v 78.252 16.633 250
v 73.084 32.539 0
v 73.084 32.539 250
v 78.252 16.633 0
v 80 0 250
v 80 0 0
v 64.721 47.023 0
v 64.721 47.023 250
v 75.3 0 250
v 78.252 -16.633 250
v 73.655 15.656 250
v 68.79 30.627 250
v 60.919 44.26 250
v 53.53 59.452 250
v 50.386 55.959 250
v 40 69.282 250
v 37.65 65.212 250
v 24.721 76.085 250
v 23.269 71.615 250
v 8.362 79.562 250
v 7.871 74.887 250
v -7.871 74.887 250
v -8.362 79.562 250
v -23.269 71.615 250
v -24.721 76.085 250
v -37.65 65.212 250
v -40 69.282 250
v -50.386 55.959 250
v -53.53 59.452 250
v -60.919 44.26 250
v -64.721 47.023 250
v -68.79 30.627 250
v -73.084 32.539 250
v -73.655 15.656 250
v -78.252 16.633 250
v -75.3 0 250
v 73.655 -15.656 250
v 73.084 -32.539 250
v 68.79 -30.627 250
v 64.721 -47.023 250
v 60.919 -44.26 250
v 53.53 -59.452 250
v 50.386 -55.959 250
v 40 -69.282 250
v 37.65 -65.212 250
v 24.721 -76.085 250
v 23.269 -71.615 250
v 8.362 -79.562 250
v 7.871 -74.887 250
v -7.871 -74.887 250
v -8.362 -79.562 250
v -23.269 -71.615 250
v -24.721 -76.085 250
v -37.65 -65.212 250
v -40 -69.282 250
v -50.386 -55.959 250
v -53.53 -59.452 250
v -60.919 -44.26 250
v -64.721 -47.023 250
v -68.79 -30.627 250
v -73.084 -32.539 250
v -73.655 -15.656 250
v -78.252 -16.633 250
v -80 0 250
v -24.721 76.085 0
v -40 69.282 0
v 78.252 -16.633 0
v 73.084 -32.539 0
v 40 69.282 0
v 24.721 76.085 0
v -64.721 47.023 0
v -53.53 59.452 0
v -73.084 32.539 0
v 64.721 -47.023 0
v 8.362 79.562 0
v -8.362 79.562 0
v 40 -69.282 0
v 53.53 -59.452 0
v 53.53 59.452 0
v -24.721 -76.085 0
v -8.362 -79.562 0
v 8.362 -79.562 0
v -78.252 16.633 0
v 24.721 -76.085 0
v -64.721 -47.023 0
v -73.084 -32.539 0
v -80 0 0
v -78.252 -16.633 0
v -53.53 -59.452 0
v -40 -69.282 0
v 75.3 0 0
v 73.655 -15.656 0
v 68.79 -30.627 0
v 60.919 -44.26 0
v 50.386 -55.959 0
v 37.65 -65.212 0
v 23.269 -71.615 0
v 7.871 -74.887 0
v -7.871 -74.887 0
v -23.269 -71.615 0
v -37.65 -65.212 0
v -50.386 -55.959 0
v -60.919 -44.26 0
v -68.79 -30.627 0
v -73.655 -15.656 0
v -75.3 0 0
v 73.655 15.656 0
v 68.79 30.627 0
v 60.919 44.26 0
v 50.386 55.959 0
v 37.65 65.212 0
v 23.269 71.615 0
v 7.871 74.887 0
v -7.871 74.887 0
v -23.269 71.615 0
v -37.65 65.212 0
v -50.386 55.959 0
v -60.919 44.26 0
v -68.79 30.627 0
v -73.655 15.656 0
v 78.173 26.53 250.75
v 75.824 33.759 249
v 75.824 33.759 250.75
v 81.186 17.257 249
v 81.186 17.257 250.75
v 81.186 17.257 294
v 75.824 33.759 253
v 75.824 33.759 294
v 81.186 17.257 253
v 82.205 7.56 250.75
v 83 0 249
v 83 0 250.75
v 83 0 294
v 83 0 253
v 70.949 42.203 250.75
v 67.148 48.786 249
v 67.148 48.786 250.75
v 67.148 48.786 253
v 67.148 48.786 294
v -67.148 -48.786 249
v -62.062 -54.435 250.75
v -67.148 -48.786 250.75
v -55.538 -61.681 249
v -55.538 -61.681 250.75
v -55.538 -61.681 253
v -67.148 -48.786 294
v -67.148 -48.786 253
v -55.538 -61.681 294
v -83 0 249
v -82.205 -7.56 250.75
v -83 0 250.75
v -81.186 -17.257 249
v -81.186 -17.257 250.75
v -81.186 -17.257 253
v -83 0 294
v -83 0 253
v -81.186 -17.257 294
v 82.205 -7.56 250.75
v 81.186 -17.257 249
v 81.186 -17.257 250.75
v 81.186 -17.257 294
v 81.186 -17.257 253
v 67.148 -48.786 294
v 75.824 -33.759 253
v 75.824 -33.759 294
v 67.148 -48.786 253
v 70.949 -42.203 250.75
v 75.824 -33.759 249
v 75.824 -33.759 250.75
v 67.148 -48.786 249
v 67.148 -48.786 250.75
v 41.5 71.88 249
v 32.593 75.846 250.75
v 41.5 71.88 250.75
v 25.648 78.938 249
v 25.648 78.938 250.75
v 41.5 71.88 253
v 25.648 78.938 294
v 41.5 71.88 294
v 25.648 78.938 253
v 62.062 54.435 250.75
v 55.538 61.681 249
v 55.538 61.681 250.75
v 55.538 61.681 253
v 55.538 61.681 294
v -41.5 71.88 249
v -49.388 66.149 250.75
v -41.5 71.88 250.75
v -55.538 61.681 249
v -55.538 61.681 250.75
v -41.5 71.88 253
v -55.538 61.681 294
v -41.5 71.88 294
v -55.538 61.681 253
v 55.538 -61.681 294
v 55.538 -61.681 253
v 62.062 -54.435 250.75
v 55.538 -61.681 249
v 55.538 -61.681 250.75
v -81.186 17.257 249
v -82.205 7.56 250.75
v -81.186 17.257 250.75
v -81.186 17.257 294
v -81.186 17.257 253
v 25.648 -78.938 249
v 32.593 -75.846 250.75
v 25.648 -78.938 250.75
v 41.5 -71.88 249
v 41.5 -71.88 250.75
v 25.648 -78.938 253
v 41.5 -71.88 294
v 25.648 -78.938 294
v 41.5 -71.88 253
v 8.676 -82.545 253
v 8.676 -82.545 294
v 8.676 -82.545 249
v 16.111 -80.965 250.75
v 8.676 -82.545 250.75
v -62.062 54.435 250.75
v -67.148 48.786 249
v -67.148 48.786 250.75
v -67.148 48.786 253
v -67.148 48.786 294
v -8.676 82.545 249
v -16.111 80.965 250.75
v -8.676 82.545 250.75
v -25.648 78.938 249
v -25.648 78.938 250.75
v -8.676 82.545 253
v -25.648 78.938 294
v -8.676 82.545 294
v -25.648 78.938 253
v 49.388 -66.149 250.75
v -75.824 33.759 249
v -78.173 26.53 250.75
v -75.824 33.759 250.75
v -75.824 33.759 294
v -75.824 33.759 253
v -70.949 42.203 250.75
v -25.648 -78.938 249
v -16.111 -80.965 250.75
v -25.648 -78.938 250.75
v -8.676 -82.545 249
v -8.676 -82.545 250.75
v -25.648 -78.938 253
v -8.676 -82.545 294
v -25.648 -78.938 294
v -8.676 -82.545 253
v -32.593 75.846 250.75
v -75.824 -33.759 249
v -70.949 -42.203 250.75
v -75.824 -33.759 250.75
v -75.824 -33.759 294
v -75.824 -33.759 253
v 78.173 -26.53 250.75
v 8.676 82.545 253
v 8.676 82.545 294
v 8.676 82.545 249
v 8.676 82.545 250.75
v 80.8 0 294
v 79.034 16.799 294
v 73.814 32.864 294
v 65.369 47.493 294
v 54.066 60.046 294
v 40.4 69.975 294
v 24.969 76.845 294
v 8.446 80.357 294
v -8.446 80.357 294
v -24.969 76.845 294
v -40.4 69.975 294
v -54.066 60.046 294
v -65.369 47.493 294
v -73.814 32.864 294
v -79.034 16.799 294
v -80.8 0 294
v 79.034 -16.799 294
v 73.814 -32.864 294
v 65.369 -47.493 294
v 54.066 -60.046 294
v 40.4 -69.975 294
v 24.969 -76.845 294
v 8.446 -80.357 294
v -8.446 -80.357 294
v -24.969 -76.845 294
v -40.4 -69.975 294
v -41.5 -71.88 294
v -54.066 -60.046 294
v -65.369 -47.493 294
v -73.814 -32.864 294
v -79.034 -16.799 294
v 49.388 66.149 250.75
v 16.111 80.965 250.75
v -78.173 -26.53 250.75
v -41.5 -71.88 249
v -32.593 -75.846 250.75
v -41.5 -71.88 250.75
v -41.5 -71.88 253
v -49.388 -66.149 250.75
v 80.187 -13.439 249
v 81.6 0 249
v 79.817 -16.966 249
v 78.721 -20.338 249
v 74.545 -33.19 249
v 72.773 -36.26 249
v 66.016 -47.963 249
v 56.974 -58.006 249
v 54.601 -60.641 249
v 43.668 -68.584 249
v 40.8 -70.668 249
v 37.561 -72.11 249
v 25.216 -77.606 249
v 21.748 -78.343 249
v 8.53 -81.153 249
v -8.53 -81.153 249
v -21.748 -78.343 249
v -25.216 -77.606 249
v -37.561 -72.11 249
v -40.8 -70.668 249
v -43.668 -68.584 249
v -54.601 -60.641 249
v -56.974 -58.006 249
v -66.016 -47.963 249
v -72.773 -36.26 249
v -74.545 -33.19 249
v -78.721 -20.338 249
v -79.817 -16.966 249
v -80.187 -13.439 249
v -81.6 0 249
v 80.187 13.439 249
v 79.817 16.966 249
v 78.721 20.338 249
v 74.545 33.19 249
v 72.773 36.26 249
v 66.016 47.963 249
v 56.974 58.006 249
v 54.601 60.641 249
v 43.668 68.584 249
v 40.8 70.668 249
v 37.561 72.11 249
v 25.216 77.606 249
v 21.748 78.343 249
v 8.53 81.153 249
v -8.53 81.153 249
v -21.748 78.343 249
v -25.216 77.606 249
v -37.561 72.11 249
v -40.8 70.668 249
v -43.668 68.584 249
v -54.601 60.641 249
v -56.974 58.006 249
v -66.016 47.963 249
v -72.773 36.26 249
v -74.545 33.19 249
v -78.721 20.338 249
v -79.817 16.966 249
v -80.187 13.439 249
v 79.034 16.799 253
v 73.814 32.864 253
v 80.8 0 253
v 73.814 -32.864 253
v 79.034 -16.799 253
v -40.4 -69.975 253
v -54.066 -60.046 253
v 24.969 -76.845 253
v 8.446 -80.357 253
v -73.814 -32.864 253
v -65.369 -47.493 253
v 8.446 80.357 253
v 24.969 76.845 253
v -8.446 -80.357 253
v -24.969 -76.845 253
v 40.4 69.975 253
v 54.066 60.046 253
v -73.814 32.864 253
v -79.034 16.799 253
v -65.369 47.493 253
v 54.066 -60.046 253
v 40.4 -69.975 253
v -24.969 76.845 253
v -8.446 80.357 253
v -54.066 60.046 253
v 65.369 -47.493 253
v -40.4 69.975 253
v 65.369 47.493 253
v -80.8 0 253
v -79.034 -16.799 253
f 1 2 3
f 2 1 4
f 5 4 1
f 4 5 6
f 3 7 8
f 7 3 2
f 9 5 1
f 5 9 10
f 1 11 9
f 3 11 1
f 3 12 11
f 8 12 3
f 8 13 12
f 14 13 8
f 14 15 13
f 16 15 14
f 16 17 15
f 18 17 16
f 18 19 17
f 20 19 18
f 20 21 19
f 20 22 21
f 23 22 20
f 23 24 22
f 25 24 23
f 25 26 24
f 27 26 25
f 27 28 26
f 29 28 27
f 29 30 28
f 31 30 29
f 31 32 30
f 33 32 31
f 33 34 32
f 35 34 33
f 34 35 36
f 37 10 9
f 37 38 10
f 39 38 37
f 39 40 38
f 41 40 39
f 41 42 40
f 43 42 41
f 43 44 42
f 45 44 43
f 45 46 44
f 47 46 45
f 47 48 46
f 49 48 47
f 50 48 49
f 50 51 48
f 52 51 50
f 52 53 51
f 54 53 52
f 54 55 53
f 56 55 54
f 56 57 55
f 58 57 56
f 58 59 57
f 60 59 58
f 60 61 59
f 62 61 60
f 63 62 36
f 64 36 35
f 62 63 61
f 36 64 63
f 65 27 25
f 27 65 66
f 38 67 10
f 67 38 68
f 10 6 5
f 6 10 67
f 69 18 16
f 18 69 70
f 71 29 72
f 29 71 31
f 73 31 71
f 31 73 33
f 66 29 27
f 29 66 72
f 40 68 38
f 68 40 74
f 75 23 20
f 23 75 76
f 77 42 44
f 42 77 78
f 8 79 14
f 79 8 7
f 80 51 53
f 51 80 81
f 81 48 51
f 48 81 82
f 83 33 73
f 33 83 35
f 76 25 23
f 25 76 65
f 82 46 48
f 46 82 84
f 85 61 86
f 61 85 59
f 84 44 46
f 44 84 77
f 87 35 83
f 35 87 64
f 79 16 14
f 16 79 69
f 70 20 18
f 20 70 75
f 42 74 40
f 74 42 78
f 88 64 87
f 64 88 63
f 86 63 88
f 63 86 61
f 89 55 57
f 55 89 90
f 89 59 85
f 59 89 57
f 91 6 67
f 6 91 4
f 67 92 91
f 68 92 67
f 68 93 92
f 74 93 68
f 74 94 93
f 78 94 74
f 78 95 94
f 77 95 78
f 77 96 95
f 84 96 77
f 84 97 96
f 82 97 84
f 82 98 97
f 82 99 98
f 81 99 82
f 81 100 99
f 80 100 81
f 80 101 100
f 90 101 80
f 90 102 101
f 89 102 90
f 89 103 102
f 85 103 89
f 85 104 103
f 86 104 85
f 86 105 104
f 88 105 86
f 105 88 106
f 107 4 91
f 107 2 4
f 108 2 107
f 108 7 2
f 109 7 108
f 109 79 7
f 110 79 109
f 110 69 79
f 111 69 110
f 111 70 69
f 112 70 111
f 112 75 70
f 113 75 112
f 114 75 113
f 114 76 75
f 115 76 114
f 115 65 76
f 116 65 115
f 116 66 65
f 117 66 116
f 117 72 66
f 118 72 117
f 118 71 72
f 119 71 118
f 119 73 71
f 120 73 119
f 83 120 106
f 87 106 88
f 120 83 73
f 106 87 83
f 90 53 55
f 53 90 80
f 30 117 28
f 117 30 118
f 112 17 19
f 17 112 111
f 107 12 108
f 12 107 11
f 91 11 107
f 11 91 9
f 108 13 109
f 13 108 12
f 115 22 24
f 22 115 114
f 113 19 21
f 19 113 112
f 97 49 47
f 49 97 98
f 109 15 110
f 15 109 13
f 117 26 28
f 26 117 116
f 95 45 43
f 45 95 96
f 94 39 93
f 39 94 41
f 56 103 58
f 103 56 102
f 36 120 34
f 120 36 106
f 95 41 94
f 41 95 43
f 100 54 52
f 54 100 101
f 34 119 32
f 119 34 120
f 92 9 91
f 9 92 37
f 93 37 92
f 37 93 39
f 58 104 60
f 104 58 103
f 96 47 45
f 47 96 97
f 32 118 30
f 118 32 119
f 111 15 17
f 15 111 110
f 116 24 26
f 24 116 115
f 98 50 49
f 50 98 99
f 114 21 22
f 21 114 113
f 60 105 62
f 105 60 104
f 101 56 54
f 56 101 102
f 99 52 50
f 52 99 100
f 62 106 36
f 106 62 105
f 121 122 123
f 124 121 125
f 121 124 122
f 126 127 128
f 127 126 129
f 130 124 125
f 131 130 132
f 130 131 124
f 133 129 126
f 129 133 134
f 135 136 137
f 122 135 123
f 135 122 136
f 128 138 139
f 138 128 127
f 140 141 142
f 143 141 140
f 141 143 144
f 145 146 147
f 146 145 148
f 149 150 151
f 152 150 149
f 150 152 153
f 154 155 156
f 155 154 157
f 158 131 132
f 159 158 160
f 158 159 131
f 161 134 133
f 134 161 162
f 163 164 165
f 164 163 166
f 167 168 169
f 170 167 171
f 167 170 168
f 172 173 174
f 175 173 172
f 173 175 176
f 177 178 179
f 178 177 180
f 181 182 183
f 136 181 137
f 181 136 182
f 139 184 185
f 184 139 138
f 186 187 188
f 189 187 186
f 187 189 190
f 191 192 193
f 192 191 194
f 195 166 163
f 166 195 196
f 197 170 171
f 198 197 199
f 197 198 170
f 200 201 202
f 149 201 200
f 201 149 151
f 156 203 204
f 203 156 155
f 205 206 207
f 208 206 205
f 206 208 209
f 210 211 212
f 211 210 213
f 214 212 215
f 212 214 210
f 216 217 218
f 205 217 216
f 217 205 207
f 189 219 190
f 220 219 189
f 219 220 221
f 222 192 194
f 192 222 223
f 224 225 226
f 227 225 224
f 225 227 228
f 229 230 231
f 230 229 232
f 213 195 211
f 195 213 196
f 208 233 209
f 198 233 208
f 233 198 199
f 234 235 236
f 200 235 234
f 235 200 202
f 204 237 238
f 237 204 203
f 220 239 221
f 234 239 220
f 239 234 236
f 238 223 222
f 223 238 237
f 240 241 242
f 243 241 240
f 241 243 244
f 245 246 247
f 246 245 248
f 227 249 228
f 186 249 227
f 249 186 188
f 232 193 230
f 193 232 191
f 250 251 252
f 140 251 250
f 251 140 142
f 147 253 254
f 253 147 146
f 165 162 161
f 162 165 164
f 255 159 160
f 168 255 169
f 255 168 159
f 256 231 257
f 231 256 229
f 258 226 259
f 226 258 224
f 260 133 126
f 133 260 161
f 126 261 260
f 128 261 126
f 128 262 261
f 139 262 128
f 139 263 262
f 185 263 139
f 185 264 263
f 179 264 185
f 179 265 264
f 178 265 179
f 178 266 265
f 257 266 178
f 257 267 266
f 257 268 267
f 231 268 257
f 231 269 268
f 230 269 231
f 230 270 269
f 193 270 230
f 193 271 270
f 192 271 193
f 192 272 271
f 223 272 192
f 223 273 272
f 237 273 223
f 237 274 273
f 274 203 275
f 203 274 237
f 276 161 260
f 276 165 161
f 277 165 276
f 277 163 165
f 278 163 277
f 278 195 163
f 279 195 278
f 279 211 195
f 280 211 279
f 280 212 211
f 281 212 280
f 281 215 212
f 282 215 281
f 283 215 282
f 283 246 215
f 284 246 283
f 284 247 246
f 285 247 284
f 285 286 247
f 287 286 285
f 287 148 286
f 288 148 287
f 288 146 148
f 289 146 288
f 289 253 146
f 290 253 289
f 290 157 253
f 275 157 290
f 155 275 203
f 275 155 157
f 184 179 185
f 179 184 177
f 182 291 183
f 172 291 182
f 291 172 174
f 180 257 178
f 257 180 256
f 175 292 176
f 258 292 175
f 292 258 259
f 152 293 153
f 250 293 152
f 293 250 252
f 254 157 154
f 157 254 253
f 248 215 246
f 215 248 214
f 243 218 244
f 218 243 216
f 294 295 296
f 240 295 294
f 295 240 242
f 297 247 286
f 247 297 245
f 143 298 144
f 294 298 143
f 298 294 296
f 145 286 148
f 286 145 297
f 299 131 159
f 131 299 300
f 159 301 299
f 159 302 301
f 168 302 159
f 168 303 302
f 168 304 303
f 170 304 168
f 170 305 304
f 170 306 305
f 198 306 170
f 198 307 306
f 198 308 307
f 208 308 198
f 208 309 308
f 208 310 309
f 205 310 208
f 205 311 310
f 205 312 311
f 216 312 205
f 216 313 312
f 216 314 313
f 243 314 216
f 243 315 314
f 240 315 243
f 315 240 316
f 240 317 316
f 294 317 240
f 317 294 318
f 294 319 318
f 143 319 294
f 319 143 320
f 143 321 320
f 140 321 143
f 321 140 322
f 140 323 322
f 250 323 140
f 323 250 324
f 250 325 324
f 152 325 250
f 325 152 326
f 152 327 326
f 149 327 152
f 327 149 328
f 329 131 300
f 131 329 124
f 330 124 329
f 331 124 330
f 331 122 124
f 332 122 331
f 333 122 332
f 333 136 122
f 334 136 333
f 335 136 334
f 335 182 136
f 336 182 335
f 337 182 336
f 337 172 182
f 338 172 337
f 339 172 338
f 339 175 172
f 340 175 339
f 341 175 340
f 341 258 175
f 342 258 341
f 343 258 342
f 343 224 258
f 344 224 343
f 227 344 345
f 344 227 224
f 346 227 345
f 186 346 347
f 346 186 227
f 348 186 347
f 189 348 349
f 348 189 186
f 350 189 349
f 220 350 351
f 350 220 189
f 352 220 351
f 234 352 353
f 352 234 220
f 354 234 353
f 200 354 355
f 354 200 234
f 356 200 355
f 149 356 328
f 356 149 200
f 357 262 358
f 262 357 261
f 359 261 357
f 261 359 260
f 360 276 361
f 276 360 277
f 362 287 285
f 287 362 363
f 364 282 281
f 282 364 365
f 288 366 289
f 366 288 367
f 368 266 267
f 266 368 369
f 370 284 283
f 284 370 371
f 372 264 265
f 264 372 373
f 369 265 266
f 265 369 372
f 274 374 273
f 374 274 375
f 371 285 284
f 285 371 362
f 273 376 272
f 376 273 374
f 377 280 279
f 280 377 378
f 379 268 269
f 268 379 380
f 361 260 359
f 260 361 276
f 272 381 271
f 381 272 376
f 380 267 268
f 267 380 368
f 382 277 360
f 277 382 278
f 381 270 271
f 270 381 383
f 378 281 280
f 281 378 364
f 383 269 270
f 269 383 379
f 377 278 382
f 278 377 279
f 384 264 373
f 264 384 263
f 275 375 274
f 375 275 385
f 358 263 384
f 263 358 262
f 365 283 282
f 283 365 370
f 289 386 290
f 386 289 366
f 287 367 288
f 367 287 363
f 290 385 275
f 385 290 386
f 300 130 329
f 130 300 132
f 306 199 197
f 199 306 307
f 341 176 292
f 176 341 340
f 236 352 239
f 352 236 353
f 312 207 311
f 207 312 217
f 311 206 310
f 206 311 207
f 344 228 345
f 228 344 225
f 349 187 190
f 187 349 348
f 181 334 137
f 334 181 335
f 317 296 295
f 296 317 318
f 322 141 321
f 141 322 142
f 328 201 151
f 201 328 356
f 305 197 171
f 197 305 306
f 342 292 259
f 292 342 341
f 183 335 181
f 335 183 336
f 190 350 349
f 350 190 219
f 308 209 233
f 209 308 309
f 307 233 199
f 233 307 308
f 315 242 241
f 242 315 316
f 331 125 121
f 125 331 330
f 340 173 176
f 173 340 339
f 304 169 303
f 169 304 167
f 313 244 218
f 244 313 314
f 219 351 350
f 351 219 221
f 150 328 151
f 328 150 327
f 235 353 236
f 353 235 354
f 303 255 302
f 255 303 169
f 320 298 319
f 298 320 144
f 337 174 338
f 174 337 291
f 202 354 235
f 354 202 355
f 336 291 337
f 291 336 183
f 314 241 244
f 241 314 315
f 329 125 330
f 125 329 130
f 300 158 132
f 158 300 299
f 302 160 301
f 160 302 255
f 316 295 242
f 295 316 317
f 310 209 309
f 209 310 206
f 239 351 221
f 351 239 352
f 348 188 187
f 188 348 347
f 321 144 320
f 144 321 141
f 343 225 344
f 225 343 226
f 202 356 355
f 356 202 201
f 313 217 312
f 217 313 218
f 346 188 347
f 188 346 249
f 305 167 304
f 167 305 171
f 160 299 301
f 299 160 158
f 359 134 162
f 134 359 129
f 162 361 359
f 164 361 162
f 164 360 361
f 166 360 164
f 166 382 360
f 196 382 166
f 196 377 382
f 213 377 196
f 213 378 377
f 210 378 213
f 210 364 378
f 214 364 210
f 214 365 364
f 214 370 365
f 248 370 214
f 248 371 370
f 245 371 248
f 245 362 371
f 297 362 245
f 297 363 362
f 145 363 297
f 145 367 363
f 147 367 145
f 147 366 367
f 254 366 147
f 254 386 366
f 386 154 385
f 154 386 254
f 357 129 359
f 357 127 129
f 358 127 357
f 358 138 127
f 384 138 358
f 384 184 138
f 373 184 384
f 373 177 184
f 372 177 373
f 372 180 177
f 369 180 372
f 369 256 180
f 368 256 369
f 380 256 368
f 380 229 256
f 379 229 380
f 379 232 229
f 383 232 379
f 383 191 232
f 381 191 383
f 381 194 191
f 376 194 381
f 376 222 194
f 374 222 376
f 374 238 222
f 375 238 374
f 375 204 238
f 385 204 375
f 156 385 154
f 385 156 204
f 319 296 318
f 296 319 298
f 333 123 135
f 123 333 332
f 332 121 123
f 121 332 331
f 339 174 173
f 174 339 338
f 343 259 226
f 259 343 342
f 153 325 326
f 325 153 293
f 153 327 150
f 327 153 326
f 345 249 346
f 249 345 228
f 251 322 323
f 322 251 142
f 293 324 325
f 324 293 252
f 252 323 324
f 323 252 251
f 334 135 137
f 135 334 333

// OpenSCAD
// Parameters
pipe_standard = 1; //[1:1:1]
nominal_diameter = 160; //[80:320:1]
length_mm = 250; //[125:500:1]
pipe_od = 160; //[80:320:1]
wall_thickness = 4.7; //[2.35:9.4:0.1]
include_end_fitting = 1; //[0:1:1]
overlap = 1; //[0.5:2:0.1]
socket_length = 45; //[25:90:1]
socket_wall_extra = 3; //[1.5:6:0.1]
socket_id_clearance = 0.8; //[0.2:2:0.1]
stop_ring_length = 6; //[3:15:0.5]
stop_ring_radial = 2; //[1:5:0.1]
chamfer_length = 4; //[2:10:0.5]

// Ht Pipe - complete geometry
module ht_pipe() {
  color([0.85, 0.85, 0.8]) {
    // Hollow tube body
    difference() {
      cylinder(r=pipe_od/2, h=length_mm, center=false);
      translate([0, 0, -overlap])
        cylinder(r=pipe_od/2 - wall_thickness, h=length_mm + 2*overlap, center=false);
    }
    
    // End fitting (socket)
    if (include_end_fitting) {
      difference() {
        translate([0, 0, length_mm - overlap])
          cylinder(r=pipe_od/2 + socket_wall_extra, h=socket_length, center=false);
        translate([0, 0, length_mm - 2*overlap])
          cylinder(r=pipe_od/2 + socket_id_clearance, h=socket_length + 2*overlap, center=false);
        translate([0, 0, length_mm - overlap + (socket_length - stop_ring_length) - overlap])
          cylinder(r=pipe_od/2 + socket_id_clearance - stop_ring_radial, h=stop_ring_length + 2*overlap, center=false);
        translate([0, 0, length_mm - 2*overlap])
          cylinder(r1=pipe_od/2 + socket_id_clearance, r2=pipe_od/2 + socket_id_clearance + chamfer_length, h=chamfer_length + overlap, center=false);
      }
    }
  }
}

// Assembly
module assembly() {
  ht_pipe();
}

assembly();
